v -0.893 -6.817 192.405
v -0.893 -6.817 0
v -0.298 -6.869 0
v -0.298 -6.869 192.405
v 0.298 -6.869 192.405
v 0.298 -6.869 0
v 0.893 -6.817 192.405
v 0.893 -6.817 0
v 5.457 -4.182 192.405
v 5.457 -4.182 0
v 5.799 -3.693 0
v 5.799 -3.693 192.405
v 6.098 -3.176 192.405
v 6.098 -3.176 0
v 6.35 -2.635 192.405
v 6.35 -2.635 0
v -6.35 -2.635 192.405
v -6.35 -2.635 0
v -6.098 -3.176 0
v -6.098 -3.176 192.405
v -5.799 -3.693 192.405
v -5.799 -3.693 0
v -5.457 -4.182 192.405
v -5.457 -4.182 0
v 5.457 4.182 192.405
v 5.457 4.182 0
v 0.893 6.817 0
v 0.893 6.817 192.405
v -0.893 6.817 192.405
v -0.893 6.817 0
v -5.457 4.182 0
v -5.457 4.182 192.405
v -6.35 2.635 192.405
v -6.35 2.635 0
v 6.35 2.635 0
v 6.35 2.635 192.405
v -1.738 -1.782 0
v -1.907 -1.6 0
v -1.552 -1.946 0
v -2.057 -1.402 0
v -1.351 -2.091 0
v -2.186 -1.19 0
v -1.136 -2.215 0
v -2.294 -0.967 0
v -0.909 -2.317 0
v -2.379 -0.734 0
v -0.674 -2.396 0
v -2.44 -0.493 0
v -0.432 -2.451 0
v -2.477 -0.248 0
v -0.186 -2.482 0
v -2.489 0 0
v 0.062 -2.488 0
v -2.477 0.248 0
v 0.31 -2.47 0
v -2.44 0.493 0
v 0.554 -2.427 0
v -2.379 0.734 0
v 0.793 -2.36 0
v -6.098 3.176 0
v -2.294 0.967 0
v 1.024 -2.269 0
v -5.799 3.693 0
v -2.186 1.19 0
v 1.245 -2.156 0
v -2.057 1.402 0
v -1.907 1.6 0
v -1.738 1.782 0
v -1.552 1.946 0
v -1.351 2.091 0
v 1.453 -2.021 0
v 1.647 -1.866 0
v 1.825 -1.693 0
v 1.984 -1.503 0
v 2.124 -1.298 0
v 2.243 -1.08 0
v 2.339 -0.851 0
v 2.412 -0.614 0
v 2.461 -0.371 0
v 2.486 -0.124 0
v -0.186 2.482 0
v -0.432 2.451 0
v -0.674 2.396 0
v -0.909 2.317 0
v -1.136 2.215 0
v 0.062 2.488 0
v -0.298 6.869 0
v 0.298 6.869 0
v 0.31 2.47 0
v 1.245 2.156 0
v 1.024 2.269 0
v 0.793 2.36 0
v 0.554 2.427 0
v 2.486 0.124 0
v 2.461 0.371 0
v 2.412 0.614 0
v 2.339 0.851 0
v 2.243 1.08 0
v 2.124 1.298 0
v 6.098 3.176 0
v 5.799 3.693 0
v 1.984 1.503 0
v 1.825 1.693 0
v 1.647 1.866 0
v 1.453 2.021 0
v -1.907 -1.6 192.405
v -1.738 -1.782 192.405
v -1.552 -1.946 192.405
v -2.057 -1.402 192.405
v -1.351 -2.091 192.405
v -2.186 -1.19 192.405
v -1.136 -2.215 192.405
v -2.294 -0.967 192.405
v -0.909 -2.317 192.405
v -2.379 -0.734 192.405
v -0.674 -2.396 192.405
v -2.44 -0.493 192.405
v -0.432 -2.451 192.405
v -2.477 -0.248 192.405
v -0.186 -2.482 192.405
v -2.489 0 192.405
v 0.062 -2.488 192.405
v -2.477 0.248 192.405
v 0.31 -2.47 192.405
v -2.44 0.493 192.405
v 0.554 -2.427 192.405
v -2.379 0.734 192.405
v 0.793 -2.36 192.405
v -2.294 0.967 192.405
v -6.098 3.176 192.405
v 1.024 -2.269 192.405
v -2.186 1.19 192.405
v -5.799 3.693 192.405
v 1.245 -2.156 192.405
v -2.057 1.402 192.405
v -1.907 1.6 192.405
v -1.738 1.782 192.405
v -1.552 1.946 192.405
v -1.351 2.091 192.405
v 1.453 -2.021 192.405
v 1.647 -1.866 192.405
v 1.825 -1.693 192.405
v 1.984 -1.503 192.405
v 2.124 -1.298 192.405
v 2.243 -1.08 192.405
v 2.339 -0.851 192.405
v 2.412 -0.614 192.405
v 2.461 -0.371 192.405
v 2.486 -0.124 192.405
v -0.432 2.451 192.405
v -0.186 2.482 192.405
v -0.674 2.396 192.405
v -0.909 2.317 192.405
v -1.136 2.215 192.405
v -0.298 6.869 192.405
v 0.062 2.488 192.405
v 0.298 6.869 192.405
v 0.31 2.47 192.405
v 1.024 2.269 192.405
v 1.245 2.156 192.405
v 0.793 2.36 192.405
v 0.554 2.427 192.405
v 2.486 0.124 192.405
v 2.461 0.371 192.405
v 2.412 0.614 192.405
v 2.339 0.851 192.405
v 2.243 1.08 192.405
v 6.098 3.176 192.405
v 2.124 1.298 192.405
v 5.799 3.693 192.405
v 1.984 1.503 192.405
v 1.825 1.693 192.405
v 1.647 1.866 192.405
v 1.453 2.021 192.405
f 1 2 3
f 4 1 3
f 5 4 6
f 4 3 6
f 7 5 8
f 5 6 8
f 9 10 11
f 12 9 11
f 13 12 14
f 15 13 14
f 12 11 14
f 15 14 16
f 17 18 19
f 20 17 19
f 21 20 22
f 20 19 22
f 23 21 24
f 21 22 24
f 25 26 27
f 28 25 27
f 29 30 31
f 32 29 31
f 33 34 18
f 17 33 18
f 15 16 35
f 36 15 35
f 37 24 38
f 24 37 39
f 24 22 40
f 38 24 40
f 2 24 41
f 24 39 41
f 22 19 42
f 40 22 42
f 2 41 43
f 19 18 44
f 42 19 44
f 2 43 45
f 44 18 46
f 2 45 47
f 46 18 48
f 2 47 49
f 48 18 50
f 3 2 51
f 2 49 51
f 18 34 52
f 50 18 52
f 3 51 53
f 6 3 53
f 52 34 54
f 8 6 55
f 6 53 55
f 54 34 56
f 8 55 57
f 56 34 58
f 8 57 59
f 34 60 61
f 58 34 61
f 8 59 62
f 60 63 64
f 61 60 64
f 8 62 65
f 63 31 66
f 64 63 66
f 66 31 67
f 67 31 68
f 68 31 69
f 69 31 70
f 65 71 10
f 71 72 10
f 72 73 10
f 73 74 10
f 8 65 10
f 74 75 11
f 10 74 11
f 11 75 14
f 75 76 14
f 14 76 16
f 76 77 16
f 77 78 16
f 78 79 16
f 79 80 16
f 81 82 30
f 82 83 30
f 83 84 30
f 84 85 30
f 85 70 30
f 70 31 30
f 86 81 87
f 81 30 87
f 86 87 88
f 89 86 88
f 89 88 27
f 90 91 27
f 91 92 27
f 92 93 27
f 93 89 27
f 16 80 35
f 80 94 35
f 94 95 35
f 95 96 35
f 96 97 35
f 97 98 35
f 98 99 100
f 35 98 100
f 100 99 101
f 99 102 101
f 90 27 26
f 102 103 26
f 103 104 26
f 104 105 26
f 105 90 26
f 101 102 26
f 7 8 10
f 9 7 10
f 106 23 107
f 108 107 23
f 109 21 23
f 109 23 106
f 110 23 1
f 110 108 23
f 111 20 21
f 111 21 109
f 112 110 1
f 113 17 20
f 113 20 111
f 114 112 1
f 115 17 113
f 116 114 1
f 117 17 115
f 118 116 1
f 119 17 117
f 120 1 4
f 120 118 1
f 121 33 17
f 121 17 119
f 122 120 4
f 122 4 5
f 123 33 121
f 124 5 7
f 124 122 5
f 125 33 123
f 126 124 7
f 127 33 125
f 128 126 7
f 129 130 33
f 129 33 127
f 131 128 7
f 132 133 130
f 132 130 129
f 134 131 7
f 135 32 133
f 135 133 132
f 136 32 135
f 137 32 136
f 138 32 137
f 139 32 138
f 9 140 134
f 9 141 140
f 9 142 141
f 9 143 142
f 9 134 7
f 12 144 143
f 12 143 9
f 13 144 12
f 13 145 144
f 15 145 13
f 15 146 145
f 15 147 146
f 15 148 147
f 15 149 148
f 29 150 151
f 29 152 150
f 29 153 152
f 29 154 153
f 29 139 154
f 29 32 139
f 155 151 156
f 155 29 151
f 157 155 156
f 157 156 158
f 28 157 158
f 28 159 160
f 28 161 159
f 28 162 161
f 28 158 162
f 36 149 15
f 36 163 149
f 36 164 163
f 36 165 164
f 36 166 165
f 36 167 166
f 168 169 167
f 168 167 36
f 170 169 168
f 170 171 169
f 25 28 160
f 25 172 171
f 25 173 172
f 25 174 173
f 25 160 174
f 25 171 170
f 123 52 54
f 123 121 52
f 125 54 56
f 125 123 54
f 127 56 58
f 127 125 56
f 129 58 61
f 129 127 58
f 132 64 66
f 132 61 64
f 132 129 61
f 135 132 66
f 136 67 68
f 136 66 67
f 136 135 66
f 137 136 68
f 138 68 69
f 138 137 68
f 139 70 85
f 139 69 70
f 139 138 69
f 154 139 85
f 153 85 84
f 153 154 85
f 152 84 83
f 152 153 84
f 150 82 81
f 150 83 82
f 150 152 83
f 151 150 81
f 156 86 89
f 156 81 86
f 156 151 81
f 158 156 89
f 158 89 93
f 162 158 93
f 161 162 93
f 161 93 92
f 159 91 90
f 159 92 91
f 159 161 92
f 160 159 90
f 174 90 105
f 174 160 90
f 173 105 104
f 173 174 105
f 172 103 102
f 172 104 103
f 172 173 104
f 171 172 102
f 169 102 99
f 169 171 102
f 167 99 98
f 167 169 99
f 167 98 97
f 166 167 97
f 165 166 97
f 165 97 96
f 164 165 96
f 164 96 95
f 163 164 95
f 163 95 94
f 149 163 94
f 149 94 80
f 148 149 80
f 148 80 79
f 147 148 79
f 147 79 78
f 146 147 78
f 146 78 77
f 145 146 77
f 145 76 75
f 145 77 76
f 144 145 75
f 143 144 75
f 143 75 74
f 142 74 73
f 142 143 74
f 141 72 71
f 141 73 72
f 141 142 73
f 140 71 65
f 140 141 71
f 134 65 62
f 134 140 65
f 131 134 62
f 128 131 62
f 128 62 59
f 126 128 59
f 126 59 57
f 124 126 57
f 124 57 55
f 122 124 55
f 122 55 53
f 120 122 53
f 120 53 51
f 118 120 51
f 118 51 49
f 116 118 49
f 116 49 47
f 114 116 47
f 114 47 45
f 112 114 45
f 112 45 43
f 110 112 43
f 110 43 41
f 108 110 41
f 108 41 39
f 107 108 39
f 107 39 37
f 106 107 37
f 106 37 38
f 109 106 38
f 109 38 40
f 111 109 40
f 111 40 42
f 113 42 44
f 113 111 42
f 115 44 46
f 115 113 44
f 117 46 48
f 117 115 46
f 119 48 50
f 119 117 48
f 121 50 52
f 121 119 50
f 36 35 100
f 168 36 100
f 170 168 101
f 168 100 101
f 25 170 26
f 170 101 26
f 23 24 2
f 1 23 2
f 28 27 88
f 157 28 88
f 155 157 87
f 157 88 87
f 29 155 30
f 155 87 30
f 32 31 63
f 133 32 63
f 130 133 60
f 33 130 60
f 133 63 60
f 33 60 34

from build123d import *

# Parameters (mm, degrees)
BOSS_EXTRUDE1_DEPTH     = 192.405
CUT_EXTRUDE1_DEPTH      = 193.632479478
CUT_EXTRUDE1_DEPTH_BACK = 193.632479478
SKETCH2_R               = 2.4892


with BuildPart() as part:
    # Sketch1 → Boss-Extrude1 (new body)
    with BuildSketch(Plane.XY):
        with BuildLine():
            Line((-0.893039494, 6.816751826), (-5.456960506, 4.181770802))
            ThreePointArc((-5.456960506, 4.181770802), (-5.953924651, 3.4375), (-6.35, 2.634981025))
            Line((-6.35, 2.634981025), (-6.35, -2.634981025))
            ThreePointArc((-6.35, -2.634981025), (-5.953924651, -3.4375), (-5.456960506, -4.181770802))
            Line((-5.456960506, -4.181770802), (-0.893039494, -6.816751826))
            ThreePointArc((-0.893039494, -6.816751826), (0, -6.875), (0.893039494, -6.816751826))
            Line((0.893039494, -6.816751826), (5.456960506, -4.181770802))
            ThreePointArc((5.456960506, -4.181770802), (5.953924651, -3.4375), (6.35, -2.634981025))
            Line((6.35, -2.634981025), (6.35, 2.634981025))
            ThreePointArc((6.35, 2.634981025), (5.953924651, 3.4375), (5.456960506, 4.181770802))
            Line((5.456960506, 4.181770802), (0.893039494, 6.816751826))
            ThreePointArc((0.893039494, 6.816751826), (0, 6.875), (-0.893039494, 6.816751826))
        make_face()
    extrude(amount=BOSS_EXTRUDE1_DEPTH)

    # Sketch2 → Cut-Extrude1 (cut, two sides: drawn at the far end of the back side and taken through both)
    with BuildSketch(Plane(origin=(0, 0, 0), x_dir=(-1, 0, 0), z_dir=(0, 0, -1)).offset(-CUT_EXTRUDE1_DEPTH_BACK)):
        Circle(SKETCH2_R)
    extrude(amount=CUT_EXTRUDE1_DEPTH + CUT_EXTRUDE1_DEPTH_BACK, mode=Mode.SUBTRACT)


solid = part.part
